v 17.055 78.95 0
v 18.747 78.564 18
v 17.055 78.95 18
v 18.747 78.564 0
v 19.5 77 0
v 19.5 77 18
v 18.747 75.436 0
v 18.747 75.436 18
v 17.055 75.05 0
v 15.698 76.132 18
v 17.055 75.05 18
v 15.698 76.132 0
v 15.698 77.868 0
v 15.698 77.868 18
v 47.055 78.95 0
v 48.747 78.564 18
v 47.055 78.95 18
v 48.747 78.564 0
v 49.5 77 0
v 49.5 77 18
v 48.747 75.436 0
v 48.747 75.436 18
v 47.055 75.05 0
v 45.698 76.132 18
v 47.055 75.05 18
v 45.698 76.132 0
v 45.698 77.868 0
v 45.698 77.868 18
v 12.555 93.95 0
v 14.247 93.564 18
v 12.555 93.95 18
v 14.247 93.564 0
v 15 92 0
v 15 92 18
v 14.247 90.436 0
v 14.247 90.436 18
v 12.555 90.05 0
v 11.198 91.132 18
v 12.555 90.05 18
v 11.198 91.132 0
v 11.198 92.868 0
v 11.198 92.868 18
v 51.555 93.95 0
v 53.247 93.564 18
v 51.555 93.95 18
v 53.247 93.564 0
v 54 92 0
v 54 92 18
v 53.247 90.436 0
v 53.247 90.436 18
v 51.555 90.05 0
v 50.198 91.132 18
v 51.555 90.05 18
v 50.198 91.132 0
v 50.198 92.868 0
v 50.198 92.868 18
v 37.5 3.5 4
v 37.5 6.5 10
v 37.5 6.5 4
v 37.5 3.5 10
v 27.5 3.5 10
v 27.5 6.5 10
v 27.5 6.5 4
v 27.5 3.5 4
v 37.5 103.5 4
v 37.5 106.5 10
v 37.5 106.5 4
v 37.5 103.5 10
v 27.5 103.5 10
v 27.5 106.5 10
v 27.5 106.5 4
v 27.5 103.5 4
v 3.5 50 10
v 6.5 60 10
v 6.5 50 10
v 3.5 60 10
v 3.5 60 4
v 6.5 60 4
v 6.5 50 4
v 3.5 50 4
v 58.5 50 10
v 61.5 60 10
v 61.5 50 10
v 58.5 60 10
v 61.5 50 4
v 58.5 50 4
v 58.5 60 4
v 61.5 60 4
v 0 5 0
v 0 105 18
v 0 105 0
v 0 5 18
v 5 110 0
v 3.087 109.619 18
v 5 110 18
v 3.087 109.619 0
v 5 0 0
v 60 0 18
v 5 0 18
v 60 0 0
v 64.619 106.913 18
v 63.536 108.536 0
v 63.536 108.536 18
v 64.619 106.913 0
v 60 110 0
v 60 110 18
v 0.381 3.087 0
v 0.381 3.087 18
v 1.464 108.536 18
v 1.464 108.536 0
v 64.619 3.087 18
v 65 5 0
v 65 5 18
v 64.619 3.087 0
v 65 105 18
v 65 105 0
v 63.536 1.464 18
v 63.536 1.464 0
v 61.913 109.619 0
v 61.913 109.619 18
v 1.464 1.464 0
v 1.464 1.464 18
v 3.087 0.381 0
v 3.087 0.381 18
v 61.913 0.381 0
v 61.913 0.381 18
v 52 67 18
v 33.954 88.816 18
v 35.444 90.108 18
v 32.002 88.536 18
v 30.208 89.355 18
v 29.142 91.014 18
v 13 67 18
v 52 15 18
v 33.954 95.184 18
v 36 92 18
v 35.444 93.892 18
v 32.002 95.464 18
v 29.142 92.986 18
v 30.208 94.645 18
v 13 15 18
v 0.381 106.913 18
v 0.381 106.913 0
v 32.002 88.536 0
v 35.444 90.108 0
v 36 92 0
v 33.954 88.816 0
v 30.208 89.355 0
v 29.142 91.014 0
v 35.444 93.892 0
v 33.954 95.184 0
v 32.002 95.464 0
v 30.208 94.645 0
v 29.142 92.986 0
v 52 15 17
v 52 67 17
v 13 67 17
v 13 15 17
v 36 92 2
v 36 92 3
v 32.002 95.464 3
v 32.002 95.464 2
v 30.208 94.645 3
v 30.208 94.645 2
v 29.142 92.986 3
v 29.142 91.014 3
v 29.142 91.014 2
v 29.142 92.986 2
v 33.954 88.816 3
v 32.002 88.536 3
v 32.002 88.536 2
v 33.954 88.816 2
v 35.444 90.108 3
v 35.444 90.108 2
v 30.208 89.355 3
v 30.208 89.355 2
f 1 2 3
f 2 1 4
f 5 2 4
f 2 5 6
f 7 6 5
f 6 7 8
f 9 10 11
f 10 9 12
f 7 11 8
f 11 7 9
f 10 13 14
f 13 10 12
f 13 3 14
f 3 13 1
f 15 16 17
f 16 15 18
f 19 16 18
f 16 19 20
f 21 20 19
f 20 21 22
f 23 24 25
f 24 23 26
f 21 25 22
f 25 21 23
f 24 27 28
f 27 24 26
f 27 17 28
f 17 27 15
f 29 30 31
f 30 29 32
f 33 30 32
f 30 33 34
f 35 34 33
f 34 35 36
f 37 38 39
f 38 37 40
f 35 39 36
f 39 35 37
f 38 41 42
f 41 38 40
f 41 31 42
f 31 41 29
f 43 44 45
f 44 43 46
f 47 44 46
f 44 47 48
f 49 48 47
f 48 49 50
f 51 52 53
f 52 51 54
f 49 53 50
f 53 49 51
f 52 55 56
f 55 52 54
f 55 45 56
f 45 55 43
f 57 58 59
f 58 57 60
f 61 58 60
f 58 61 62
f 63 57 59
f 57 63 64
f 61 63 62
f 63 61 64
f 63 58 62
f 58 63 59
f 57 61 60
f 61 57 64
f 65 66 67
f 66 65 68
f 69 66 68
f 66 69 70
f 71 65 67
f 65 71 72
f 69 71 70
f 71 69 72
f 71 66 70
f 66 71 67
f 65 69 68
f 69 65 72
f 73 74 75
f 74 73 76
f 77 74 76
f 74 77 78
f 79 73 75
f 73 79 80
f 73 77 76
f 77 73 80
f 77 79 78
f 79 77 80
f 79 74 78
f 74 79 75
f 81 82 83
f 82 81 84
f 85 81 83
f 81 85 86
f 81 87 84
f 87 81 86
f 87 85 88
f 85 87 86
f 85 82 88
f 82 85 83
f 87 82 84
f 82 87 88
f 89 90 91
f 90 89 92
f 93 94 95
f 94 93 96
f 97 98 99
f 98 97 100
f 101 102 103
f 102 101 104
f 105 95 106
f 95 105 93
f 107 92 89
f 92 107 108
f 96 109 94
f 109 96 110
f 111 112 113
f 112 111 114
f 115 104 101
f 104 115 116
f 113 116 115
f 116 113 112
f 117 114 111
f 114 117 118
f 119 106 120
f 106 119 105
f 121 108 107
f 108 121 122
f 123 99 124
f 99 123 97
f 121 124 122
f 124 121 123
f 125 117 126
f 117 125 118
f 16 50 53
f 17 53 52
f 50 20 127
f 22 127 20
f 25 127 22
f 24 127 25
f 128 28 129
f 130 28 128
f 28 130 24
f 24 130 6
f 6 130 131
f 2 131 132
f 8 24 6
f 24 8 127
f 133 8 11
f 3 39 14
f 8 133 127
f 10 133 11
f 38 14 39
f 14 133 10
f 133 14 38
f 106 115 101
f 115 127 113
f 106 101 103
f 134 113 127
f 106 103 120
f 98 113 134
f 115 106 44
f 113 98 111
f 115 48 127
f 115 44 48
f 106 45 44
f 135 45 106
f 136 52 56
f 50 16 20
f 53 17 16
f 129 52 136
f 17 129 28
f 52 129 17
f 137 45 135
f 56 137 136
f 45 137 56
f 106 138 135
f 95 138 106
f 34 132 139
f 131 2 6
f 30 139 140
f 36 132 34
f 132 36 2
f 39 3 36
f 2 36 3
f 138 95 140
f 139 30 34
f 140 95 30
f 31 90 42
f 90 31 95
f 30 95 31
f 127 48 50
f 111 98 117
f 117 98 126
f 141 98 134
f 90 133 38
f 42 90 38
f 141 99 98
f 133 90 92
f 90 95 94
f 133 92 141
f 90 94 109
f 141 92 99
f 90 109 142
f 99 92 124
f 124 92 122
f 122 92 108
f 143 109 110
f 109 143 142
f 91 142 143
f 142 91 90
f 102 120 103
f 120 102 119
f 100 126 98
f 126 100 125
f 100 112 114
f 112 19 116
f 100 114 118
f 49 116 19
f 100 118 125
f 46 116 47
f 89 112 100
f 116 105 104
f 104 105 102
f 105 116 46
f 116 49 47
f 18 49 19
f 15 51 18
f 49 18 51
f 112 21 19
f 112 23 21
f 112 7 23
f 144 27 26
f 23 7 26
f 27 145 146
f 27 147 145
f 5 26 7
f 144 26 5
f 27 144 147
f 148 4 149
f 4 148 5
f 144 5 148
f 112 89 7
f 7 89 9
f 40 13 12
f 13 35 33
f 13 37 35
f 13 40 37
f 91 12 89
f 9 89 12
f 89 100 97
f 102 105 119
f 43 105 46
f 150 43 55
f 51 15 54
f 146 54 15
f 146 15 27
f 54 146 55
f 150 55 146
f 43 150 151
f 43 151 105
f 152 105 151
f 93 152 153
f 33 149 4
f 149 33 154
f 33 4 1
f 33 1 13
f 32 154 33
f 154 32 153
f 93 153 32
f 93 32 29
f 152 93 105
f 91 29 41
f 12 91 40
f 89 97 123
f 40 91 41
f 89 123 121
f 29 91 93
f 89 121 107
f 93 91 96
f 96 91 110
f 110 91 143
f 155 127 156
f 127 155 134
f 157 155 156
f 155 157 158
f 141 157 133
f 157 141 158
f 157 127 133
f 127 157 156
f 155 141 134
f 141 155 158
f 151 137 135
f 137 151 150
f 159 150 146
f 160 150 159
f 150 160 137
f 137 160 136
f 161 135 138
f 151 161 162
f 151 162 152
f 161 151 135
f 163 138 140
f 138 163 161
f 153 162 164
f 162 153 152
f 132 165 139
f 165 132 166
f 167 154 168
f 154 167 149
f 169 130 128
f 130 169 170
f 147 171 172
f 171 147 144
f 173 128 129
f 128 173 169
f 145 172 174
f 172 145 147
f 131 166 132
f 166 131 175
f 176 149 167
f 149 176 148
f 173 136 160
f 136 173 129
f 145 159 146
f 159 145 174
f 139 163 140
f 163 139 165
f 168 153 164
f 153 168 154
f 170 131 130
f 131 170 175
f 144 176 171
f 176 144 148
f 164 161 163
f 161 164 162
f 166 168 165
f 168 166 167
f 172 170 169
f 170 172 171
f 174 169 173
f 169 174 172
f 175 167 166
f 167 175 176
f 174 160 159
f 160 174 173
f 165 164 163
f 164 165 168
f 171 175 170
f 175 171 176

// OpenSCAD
/*
ESP32-S3 iPod Case - OpenSCAD Model
Generate STL files for 3D printing
*/

// =====================================================
// PARAMETERS - Adjust these for your specific needs
// =====================================================

// Case dimensions
case_length = 110;
case_width = 65;
case_height = 18;
wall_thickness = 2;

// Display dimensions (MSP2806)
display_length = 52;
display_width = 39;
display_recess = 1;
display_offset_y = 15; // Distance from top

// ESP32-S3 dimensions
esp32_length = 55;
esp32_width = 25.5;
esp32_height = 15;

// Rotary encoder
encoder_diameter = 20;
encoder_hole = 7;
encoder_offset_y = 25; // Distance from display

// Button positions (relative to encoder center)
button_diameter = 4;
button_spacing = 15; // Distance from encoder center

// USB-C cutout
usb_width = 10;
usb_height = 4.5;

// =====================================================
// MAIN ASSEMBLY
// =====================================================

// Uncomment the part you want to generate:
top_shell();
//bottom_shell();

// =====================================================
// TOP SHELL (Front with display and buttons)
// =====================================================

module top_shell() {
    difference() {
        // Main shell body
        shell_body();
        
        // Display window
        translate([case_width/2 - display_width/2, display_offset_y, case_height - display_recess]) {
            cube([display_width, display_length, display_recess + 1]);
        }
        
        // Rotary encoder hole
        translate([case_width/2, display_offset_y + display_length + encoder_offset_y, -1]) {
            cylinder(d=encoder_hole, h=case_height + 2);
        }
        
        // Button holes
        button_positions();
        
        // Snap-fit receptacles
        snap_fit_holes();
    }
    
    // Display mounting posts
    display_mounting_posts();
    
    // Encoder mounting ring
    encoder_mounting_ring();
}

// =====================================================
// BOTTOM SHELL (Back with component mounts)
// =====================================================

module bottom_shell() {
    difference() {
        // Main shell body
        shell_body();
        
        // USB-C cutout
        translate([case_width/2 - usb_width/2, -1, case_height - usb_height - 2]) {
            cube([usb_width, wall_thickness + 2, usb_height]);
        }
        
        // Ventilation holes
        ventilation_holes();
        
        // Component cavity
        translate([wall_thickness, wall_thickness, wall_thickness]) {
            cube([case_width - 2*wall_thickness, case_length - 2*wall_thickness, case_height]);
        }
    }
    
    // ESP32-S3 mounting channel
    esp32_mount();
    
    // Snap-fit tabs
    snap_fit_tabs();
    
    // Alignment posts
    alignment_posts();
}

// =====================================================
// BASIC SHELL SHAPE
// =====================================================

module shell_body() {
    // Rounded rectangle shell
    hull() {
        translate([5, 5, 0]) cylinder(r=5, h=case_height);
        translate([case_width-5, 5, 0]) cylinder(r=5, h=case_height);
        translate([5, case_length-5, 0]) cylinder(r=5, h=case_height);
        translate([case_width-5, case_length-5, 0]) cylinder(r=5, h=case_height);
    }
}

// =====================================================
// DISPLAY MOUNTING
// =====================================================

module display_mounting_posts() {
    // 4 mounting posts for M2.5 screws
    post_positions = [
        [case_width/2 - 25, display_offset_y + 5],
        [case_width/2 + 25, display_offset_y + 5],
        [case_width/2 - 25, display_offset_y + display_length - 5],
        [case_width/2 + 25, display_offset_y + display_length - 5]
    ];
    
    for (pos = post_positions) {
        translate([pos[0], pos[1], wall_thickness]) {
            difference() {
                cylinder(d=4.5, h=4);
                cylinder(d=2, h=5); // M2.5 hole
            }
        }
    }
}

// =====================================================
// ROTARY ENCODER MOUNTING
// =====================================================

module encoder_mounting_ring() {
    translate([case_width/2, display_offset_y + display_length + encoder_offset_y, wall_thickness]) {
        difference() {
            cylinder(d=encoder_diameter, h=1);
            cylinder(d=encoder_hole, h=2);
        }
    }
}

// =====================================================
// BUTTON POSITIONS
// =====================================================

module button_positions() {
    encoder_center_x = case_width/2;
    encoder_center_y = display_offset_y + display_length + encoder_offset_y;
    
    // Menu button (top-left)
    translate([encoder_center_x - button_spacing, encoder_center_y - button_spacing, -1]) {
        cylinder(d=button_diameter, h=case_height + 2);
    }
    
    // Play button (top-right)
    translate([encoder_center_x + button_spacing, encoder_center_y - button_spacing, -1]) {
        cylinder(d=button_diameter, h=case_height + 2);
    }
    
    // Previous button (left)
    translate([encoder_center_x - button_spacing*1.3, encoder_center_y, -1]) {
        cylinder(d=button_diameter, h=case_height + 2);
    }
    
    // Next button (right)
    translate([encoder_center_x + button_spacing*1.3, encoder_center_y, -1]) {
        cylinder(d=button_diameter, h=case_height + 2);
    }
}

// =====================================================
// ESP32-S3 MOUNTING
// =====================================================

module esp32_mount() {
    // Friction fit channel for ESP32-S3
    translate([case_width/2 - esp32_width/2 - 1, case_length - esp32_length - 10, wall_thickness]) {
        difference() {
            cube([esp32_width + 2, esp32_length + 2, esp32_height/2]);
            translate([1, 1, -1]) {
                cube([esp32_width, esp32_length, esp32_height/2 + 2]);
            }
        }
    }
}

// =====================================================
// SNAP-FIT MECHANISM
// =====================================================

module snap_fit_tabs() {
    // 4 snap-fit tabs around perimeter
    tab_positions = [
        [case_width/2, 5, 0],
        [case_width/2, case_length-5, 0],
        [5, case_length/2, 90],
        [case_width-5, case_length/2, 90]
    ];
    
    for (pos = tab_positions) {
        translate([pos[0], pos[1], case_height/2]) {
            rotate([0, 0, pos[2]]) {
                snap_fit_tab();
            }
        }
    }
}

module snap_fit_tab() {
    translate([0, 0, 0]) {
        cube([8, 1, 4], center=true);
        translate([0, 1.5, 0]) {
            cube([6, 1, 3], center=true);
        }
    }
}

module snap_fit_holes() {
    // Corresponding holes for snap-fit tabs
    tab_positions = [
        [case_width/2, 5, 0],
        [case_width/2, case_length-5, 0],
        [5, case_length/2, 90],
        [case_width-5, case_length/2, 90]
    ];
    
    for (pos = tab_positions) {
        translate([pos[0], pos[1], case_height/2 - 2]) {
            rotate([0, 0, pos[2]]) {
                cube([10, 3, 6], center=true);
            }
        }
    }
}

// =====================================================
// ALIGNMENT POSTS
// =====================================================

module alignment_posts() {
    // 2 alignment posts to prevent misalignment
    translate([15, 15, case_height - 5]) {
        cylinder(d=3, h=5);
    }
    translate([case_width-15, case_length-15, case_height - 5]) {
        cylinder(d=3, h=5);
    }
}

// =====================================================
// VENTILATION
// =====================================================

module ventilation_holes() {
    // 4 ventilation holes in back panel
    hole_positions = [
        [15, case_length - 15],
        [case_width - 15, case_length - 15],
        [15, case_length - 35],
        [case_width - 15, case_length - 35]
    ];
    
    for (pos = hole_positions) {
        translate([pos[0], pos[1], -1]) {
            cylinder(d=3, h=wall_thickness + 2);
        }
    }
}

// =====================================================
// UTILITY FUNCTIONS
// =====================================================

// Rounded cube
module rounded_cube(size, radius) {
    hull() {
        translate([radius, radius, 0]) 
            cylinder(r=radius, h=size[2]);
        translate([size[0]-radius, radius, 0]) 
            cylinder(r=radius, h=size[2]);
        translate([radius, size[1]-radius, 0]) 
            cylinder(r=radius, h=size[2]);
        translate([size[0]-radius, size[1]-radius, 0]) 
            cylinder(r=radius, h=size[2]);
    }
}
